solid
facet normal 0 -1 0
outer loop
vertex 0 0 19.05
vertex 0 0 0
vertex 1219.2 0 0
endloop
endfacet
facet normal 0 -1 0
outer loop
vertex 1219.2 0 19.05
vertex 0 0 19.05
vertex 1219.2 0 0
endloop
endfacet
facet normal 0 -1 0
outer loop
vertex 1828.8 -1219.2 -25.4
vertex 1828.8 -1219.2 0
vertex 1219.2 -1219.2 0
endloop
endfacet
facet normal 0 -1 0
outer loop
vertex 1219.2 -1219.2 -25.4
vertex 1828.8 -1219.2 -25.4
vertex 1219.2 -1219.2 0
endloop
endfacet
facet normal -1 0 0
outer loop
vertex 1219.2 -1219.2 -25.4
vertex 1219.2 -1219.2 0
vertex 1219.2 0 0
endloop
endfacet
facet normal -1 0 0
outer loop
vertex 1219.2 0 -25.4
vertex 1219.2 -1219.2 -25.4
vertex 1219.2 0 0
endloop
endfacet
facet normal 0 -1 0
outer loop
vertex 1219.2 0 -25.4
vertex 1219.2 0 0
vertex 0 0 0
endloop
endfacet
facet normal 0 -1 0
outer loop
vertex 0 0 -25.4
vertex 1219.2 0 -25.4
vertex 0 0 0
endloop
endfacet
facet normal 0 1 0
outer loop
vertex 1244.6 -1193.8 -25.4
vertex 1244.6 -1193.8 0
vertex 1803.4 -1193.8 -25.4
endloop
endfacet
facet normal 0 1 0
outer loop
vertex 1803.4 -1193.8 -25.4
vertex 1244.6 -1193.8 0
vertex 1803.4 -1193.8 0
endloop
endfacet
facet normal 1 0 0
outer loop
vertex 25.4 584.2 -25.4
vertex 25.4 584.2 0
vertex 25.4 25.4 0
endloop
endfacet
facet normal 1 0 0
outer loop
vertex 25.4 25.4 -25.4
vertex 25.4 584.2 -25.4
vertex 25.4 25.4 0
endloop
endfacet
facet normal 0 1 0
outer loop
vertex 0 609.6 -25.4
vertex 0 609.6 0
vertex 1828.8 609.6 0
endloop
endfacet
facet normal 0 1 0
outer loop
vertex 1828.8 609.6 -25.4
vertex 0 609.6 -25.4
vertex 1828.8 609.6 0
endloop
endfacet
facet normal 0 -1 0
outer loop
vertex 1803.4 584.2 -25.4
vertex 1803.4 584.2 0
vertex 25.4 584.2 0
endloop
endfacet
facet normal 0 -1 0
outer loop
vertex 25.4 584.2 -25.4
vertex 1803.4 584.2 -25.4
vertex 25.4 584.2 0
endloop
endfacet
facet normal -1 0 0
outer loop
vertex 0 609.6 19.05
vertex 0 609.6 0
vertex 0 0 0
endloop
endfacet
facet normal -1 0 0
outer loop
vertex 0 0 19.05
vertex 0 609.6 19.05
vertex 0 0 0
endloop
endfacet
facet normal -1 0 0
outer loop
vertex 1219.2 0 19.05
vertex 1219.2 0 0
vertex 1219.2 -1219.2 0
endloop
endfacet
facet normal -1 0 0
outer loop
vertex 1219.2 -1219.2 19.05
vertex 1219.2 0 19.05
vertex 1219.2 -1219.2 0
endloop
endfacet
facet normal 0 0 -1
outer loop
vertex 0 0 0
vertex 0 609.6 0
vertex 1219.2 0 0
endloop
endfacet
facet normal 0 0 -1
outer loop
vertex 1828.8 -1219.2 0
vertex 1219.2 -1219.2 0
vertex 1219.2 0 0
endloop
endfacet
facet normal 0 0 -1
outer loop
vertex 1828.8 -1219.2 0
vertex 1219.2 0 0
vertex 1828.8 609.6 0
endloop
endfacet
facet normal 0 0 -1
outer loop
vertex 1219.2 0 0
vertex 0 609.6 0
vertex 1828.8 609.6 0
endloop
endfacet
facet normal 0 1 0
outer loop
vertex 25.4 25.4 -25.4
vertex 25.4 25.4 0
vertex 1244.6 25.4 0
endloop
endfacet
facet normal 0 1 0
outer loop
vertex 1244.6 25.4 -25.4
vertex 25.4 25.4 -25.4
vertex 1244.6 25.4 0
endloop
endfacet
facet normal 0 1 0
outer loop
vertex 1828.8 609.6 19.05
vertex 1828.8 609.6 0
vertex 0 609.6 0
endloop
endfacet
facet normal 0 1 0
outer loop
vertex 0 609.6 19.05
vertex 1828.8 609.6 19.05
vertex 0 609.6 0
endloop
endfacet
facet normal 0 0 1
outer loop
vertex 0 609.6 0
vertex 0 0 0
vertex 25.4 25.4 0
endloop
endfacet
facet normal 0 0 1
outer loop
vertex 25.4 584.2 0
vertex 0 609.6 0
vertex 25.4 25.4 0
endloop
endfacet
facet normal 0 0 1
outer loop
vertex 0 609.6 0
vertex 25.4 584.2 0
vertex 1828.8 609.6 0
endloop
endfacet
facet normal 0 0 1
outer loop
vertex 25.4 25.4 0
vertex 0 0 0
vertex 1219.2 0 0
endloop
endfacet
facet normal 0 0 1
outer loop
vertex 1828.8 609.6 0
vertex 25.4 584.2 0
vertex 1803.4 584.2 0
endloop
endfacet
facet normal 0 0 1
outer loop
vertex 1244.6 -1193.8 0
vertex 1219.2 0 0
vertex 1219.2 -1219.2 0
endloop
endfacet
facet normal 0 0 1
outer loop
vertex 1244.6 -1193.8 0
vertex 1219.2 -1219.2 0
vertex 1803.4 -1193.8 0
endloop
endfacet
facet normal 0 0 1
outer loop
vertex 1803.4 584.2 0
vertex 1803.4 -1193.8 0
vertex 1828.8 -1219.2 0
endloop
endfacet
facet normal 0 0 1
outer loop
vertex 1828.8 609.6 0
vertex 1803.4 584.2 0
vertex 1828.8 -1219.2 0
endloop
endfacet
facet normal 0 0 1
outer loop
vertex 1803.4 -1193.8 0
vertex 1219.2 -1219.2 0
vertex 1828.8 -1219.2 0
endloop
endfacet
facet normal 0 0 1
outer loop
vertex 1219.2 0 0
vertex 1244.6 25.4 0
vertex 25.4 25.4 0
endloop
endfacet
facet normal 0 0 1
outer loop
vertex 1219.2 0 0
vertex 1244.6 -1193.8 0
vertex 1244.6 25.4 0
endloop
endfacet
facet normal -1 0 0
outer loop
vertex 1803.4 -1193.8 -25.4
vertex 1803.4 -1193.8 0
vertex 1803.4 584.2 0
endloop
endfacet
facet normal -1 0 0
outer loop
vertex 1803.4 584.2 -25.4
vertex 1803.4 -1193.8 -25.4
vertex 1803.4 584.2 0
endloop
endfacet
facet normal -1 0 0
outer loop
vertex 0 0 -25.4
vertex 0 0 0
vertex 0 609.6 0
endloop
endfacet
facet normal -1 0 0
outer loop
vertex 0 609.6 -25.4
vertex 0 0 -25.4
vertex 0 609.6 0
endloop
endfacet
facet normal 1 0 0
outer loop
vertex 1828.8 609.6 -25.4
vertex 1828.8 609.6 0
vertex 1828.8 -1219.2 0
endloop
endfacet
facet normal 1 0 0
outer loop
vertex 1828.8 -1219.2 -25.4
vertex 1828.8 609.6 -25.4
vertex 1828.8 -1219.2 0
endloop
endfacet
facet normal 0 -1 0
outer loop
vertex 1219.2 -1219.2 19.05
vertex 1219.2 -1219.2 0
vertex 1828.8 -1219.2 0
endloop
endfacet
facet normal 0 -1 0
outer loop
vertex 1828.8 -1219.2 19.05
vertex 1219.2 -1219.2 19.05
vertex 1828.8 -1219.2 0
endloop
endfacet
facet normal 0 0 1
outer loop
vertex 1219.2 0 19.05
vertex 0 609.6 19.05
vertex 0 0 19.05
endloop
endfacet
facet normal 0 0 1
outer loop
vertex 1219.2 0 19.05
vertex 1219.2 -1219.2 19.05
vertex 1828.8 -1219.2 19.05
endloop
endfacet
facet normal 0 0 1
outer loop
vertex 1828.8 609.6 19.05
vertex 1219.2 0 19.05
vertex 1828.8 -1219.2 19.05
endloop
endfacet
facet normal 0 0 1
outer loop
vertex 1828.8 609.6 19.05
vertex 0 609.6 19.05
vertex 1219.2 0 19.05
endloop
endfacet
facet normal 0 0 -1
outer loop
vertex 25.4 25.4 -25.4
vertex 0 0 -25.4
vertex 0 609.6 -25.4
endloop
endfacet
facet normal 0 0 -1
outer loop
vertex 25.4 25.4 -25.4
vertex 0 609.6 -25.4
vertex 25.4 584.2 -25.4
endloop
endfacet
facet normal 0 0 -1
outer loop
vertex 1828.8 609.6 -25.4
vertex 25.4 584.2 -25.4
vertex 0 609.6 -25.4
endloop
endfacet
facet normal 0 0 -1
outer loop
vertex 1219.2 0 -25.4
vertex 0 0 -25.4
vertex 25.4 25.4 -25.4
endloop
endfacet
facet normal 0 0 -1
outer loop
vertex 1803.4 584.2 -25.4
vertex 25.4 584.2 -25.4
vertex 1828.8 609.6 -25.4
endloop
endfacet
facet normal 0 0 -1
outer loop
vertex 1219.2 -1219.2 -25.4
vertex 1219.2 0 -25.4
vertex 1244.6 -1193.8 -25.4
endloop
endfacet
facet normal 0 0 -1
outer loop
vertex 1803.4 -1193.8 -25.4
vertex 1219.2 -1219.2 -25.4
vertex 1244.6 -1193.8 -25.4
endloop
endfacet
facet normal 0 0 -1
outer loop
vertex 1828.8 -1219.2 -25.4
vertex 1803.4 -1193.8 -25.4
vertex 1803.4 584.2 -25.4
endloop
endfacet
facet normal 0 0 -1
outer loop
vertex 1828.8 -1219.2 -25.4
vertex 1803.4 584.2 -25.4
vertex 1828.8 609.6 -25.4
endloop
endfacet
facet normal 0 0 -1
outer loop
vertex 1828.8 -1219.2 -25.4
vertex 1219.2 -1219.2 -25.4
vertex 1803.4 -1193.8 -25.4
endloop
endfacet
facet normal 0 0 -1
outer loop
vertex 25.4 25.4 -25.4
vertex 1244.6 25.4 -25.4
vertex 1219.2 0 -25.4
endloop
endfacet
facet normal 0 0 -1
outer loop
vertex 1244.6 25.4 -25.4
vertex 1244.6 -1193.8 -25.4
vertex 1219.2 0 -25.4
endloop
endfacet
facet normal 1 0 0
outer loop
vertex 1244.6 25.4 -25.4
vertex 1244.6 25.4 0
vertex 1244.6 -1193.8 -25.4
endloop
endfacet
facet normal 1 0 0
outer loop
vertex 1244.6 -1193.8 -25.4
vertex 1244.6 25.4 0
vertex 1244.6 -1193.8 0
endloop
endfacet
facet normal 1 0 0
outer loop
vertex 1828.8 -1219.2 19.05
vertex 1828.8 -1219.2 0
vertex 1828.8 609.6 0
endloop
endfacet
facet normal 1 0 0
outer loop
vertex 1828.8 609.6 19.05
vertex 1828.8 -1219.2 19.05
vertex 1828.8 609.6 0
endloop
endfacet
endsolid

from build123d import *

# Parameters (mm, degrees)
F1_DEPTH = 19.05
F3_DEPTH = 25.4


with BuildPart() as f1:
    # F0 (on Top) → F1 (new body)
    with BuildSketch(Plane.XY):
        Polygon((0, 609.6), (0, 0), (1219.2, 0), (1219.2, -1219.2), (1828.8, -1219.2), (1828.8, 0), (1828.8, 609.6), align=None)
    extrude(amount=F1_DEPTH)


with BuildPart() as f3:
    # F2 (on face) → F3 (new body)
    with BuildSketch(Plane(origin=(0, 0, 0), x_dir=(1, 0, 0), z_dir=(0, 0, -1))):
        Polygon((1219.2, 0), (1218.581915, 0), (0, 0), (0, -609.6), (1828.8, -609.6), (1828.8, 1219.2), (1219.2, 1219.2), align=None)
        Polygon((25.4, -584.2), (25.4, -25.4), (1244.6, -25.4), (1244.6, 1193.8), (1803.4, 1193.8), (1803.4, -584.2), align=None, mode=Mode.SUBTRACT)
    extrude(amount=F3_DEPTH)


solid = Compound([f1.part, f3.part])
